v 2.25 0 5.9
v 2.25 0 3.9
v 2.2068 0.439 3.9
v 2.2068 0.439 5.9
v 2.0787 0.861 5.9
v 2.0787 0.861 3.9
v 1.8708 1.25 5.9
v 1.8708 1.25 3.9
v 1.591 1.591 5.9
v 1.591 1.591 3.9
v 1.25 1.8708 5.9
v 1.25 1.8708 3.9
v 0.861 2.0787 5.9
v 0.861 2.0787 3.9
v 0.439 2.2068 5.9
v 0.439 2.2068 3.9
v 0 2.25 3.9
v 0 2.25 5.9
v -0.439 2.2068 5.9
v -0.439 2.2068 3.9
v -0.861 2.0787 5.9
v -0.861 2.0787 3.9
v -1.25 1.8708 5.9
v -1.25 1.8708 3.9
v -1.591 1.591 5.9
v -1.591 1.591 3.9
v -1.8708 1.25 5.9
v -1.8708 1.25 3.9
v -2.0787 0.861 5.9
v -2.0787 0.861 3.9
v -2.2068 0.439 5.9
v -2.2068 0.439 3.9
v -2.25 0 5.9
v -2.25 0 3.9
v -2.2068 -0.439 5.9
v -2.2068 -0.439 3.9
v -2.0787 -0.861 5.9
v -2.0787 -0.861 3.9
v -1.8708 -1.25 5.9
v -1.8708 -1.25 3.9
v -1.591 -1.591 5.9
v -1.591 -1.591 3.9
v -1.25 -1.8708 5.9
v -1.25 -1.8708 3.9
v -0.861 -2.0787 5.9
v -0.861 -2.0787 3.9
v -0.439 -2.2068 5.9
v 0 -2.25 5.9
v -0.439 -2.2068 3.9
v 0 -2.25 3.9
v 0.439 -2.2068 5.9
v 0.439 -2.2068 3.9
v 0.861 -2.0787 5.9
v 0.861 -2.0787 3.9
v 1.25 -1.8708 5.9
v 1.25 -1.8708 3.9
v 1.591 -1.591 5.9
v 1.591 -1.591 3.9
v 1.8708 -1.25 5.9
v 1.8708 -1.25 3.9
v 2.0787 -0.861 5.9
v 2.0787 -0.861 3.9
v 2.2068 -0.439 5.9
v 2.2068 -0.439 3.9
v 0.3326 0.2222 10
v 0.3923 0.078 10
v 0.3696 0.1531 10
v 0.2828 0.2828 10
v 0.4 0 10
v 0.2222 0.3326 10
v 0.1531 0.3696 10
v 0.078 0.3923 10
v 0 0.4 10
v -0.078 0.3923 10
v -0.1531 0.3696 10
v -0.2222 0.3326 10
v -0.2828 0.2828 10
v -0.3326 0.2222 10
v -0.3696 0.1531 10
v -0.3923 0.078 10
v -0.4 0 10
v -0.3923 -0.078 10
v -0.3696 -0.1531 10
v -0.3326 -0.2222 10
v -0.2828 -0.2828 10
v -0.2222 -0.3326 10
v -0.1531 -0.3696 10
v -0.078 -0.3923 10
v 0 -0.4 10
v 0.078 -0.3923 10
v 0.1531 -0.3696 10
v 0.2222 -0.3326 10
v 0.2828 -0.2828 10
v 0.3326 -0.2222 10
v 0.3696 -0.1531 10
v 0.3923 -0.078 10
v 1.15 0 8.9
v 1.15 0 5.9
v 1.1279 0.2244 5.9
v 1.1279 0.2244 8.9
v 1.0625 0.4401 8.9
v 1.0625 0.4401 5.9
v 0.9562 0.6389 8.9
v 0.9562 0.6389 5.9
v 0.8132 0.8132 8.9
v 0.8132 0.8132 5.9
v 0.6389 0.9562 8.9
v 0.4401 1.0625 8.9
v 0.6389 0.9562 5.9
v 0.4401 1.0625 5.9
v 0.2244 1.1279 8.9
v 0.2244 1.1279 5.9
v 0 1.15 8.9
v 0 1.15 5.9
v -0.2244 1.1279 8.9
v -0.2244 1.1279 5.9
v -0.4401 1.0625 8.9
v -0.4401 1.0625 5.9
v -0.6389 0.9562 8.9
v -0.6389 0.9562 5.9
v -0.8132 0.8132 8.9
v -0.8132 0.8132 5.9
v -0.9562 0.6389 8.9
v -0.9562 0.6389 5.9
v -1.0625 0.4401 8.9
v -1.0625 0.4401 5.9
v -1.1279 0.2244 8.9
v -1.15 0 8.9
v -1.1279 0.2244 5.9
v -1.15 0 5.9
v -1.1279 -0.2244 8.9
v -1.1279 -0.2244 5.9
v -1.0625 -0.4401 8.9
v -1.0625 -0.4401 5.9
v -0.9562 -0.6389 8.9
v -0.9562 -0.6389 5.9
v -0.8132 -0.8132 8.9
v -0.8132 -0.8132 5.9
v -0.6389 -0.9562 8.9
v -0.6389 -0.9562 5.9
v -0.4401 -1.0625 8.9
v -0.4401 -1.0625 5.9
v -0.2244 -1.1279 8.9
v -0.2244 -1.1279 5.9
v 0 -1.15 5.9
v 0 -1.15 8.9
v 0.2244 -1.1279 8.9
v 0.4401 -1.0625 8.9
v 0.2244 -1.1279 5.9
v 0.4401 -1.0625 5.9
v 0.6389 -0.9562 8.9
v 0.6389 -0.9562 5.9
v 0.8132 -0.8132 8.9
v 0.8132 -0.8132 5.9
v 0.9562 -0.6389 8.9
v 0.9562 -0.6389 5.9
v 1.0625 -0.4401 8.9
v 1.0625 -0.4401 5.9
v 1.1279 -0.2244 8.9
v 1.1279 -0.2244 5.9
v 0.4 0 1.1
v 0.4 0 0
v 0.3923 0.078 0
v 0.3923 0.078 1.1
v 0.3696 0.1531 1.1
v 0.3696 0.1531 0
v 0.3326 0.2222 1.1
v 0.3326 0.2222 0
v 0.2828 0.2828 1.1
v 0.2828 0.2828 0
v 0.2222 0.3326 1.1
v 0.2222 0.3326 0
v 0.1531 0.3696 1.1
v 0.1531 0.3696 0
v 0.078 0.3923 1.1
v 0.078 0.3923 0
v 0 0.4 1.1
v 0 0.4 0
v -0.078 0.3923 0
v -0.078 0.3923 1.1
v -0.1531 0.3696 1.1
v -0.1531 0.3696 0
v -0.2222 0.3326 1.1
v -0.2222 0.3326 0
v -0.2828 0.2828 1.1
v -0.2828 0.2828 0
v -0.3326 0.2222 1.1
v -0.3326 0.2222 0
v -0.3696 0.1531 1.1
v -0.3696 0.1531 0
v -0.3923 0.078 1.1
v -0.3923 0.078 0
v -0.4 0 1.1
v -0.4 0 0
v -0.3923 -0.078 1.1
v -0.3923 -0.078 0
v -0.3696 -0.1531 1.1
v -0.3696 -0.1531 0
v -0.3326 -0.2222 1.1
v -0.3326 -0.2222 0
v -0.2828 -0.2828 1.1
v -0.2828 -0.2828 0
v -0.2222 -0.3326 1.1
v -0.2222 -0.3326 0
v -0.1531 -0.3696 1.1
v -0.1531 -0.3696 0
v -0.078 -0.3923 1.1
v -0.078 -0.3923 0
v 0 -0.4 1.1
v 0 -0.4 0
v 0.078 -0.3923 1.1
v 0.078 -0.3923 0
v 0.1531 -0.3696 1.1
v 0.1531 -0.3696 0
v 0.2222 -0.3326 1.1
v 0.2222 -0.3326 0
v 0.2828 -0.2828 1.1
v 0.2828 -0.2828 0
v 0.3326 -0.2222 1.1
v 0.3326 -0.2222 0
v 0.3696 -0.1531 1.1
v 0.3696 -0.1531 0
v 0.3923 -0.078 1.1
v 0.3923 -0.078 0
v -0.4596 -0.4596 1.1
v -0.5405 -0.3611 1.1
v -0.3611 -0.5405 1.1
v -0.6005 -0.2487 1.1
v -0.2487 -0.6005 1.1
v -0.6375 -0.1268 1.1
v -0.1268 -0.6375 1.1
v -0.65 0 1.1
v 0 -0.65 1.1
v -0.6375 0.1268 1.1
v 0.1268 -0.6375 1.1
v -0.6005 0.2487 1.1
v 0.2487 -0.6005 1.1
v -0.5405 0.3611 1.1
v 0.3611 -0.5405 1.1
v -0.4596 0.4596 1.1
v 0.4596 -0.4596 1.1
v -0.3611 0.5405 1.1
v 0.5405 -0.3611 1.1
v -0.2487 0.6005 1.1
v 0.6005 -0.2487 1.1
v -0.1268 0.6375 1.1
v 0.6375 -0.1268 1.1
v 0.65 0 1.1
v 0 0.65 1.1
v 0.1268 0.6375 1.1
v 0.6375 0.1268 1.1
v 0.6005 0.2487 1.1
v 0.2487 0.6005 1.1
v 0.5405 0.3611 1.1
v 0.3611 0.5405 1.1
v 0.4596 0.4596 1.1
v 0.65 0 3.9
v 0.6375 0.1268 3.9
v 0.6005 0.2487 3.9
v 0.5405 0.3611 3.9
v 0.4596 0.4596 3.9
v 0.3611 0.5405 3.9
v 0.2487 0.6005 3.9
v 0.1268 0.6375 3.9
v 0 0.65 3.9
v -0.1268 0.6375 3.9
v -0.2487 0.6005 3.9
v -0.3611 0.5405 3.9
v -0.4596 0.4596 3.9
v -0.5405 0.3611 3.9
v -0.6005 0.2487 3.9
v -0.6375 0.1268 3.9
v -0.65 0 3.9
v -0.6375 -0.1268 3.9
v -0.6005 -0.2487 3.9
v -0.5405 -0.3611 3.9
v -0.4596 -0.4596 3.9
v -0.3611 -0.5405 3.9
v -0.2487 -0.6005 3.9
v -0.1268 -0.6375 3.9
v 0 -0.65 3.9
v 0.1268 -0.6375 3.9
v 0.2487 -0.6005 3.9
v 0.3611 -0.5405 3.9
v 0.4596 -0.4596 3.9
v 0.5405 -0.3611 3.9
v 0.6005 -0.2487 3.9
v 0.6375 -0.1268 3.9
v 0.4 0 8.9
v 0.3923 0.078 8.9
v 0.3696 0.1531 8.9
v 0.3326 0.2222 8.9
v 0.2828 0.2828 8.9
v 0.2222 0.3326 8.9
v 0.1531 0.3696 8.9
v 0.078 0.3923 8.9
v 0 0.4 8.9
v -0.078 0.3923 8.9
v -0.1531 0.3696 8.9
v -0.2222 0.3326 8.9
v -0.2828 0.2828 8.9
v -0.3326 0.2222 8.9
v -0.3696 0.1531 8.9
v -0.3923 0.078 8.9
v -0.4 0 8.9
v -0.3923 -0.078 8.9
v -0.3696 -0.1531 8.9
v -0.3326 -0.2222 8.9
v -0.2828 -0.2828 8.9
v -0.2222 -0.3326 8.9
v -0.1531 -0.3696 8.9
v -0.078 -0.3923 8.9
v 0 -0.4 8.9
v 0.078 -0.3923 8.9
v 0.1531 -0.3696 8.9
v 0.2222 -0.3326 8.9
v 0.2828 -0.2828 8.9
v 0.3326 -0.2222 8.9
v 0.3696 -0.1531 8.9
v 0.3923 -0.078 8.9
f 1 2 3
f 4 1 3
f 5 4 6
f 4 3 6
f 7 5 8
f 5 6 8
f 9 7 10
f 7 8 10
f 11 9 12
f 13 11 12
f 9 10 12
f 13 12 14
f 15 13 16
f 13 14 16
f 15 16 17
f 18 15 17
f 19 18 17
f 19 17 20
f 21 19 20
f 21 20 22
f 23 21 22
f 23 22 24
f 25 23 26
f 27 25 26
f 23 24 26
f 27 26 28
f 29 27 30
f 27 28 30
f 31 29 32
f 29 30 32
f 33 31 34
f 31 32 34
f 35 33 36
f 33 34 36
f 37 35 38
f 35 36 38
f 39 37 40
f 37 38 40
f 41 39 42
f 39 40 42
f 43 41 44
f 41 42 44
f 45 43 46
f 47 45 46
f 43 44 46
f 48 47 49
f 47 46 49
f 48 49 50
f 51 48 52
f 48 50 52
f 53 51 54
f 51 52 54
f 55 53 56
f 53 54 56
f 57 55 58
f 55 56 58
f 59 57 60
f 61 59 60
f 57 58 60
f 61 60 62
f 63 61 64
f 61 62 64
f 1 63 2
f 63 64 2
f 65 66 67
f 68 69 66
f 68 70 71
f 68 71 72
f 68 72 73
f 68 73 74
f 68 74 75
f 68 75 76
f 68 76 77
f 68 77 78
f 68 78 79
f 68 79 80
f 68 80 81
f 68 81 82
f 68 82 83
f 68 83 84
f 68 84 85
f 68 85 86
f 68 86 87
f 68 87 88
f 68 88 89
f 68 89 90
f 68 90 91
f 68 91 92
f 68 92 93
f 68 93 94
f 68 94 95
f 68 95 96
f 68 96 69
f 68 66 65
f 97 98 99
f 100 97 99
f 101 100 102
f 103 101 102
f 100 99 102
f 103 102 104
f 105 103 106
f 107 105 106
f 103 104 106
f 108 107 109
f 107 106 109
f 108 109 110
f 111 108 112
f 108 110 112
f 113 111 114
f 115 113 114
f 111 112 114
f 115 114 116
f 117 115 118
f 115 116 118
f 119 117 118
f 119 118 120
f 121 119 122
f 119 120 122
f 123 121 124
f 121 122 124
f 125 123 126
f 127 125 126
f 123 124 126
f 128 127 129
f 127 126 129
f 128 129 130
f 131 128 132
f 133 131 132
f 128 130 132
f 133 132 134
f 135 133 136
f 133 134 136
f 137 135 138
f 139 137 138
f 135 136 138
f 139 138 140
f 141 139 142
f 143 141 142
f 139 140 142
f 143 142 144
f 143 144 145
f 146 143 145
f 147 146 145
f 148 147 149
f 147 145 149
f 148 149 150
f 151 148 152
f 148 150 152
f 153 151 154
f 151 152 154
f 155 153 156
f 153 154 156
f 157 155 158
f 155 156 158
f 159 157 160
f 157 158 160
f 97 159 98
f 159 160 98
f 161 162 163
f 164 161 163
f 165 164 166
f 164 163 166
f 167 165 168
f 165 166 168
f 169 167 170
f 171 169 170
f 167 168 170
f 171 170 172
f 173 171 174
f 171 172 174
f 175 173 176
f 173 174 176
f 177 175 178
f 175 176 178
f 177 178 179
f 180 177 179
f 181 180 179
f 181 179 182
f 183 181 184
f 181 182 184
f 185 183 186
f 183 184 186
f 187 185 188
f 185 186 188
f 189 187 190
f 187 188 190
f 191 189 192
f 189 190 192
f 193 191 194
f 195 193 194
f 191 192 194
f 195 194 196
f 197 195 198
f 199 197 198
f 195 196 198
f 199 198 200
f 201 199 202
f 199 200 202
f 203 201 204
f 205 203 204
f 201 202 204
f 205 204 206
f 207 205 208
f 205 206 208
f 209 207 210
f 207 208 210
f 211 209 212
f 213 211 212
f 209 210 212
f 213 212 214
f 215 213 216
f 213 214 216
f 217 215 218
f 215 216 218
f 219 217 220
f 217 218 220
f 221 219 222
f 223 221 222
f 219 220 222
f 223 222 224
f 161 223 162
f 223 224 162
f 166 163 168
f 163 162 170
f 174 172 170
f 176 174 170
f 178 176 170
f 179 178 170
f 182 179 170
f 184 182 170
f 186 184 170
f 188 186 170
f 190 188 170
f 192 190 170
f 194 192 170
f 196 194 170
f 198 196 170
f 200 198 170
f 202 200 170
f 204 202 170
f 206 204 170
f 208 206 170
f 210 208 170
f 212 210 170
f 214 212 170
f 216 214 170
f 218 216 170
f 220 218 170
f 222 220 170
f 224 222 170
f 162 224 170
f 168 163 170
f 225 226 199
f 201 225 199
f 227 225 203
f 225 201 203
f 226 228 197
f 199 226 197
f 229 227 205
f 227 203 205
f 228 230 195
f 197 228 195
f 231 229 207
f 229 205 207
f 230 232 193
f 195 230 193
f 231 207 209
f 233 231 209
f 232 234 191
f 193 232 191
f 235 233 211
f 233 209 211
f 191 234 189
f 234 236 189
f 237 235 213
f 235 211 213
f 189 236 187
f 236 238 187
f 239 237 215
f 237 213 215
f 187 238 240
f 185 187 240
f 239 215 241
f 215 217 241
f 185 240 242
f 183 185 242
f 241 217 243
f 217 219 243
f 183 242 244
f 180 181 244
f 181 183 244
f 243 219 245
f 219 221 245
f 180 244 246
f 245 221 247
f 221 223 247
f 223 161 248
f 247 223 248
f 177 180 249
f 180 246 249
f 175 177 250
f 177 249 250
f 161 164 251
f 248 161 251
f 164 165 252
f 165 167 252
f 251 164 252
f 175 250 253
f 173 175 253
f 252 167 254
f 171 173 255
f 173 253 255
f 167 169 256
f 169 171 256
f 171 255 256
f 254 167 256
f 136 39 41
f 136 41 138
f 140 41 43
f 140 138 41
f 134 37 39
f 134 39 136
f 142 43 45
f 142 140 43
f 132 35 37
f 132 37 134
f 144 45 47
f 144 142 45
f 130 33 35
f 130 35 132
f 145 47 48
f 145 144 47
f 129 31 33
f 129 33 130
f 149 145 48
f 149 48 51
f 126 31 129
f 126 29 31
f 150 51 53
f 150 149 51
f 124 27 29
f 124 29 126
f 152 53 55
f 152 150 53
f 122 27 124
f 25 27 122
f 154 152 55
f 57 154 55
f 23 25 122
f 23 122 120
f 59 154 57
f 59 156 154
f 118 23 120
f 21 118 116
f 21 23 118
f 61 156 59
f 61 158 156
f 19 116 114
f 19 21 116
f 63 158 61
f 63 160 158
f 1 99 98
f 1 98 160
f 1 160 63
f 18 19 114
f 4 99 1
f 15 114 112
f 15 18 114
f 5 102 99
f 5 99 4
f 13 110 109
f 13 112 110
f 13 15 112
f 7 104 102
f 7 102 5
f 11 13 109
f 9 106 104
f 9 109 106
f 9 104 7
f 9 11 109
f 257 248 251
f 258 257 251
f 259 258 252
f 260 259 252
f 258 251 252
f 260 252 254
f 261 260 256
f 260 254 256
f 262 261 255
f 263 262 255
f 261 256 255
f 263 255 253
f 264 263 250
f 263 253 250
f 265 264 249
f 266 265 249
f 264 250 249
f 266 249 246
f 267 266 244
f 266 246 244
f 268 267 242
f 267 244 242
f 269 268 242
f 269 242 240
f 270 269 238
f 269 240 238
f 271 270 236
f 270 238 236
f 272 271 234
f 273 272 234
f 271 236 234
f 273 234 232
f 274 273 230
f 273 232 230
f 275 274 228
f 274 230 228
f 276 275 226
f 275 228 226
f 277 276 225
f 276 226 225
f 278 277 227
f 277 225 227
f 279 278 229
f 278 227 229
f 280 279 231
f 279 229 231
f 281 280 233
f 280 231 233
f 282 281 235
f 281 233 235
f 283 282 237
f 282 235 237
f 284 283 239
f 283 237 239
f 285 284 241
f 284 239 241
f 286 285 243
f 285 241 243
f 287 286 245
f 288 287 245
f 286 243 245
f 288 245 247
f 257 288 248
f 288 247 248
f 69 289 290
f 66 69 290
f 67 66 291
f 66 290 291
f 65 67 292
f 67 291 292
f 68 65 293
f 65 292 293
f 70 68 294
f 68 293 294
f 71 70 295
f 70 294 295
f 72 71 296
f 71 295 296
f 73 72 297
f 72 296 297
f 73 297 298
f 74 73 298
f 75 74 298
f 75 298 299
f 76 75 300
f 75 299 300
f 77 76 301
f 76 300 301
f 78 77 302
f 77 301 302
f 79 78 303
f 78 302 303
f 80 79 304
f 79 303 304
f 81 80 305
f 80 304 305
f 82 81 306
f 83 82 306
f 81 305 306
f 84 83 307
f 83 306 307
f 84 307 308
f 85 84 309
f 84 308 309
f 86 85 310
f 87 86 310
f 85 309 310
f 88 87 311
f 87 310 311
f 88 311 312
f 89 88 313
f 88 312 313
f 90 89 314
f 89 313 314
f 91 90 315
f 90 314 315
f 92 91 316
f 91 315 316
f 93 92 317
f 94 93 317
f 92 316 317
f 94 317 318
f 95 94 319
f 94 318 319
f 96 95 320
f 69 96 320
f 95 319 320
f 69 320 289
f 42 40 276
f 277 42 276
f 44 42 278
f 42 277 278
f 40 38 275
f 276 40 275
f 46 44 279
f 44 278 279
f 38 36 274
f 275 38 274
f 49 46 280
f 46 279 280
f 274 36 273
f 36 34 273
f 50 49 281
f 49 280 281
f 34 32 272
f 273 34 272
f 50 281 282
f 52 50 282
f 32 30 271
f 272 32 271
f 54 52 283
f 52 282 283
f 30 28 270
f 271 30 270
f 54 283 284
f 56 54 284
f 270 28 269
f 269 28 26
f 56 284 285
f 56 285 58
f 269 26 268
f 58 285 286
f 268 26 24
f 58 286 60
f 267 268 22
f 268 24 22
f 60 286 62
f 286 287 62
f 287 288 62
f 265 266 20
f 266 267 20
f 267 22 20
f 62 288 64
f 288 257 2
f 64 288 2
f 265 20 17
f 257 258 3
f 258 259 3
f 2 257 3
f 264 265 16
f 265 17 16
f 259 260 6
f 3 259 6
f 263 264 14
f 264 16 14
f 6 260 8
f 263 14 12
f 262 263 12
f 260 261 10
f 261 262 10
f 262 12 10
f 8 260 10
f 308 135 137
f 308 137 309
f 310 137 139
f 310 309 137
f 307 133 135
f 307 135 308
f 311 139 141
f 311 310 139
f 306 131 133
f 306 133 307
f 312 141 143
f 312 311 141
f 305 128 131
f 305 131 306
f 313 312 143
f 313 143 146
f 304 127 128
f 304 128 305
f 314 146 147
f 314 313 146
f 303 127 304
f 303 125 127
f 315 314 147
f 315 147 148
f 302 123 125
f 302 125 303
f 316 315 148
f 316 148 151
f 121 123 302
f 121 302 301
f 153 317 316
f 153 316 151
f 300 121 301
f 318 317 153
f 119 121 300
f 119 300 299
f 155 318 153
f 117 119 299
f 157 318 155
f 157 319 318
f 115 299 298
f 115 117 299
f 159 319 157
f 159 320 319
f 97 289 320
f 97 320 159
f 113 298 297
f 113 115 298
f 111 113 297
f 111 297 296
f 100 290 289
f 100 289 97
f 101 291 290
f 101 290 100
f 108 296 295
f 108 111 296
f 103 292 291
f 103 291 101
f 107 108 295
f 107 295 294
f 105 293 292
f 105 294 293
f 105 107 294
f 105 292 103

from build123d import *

# Parameters (mm, degrees)
SKETCH1_R           = 0.4
BOSS_EXTRUDE1_DEPTH = 1.1
SKETCH2_R           = 0.65
BOSS_EXTRUDE2_DEPTH = 2.8
SKETCH3_R           = 2.25
BOSS_EXTRUDE3_DEPTH = 2
SKETCH4_R           = 1.15
BOSS_EXTRUDE4_DEPTH = 3
SKETCH5_R           = 0.4
BOSS_EXTRUDE5_DEPTH = 1.1


with BuildPart() as part:
    # Sketch1 → Boss-Extrude1 (new body)
    with BuildSketch(Plane.XY):
        Circle(SKETCH1_R)
    extrude(amount=BOSS_EXTRUDE1_DEPTH)

    # Sketch2 → Boss-Extrude2 (add)
    with BuildSketch(Plane.XY.offset(1.1)):
        Circle(SKETCH2_R)
    extrude(amount=BOSS_EXTRUDE2_DEPTH)

    # Sketch3 → Boss-Extrude3 (add)
    with BuildSketch(Plane.XY.offset(3.9)):
        Circle(SKETCH3_R)
    extrude(amount=BOSS_EXTRUDE3_DEPTH)

    # Sketch4 → Boss-Extrude4 (add)
    with BuildSketch(Plane.XY.offset(5.9)):
        Circle(SKETCH4_R)
    extrude(amount=BOSS_EXTRUDE4_DEPTH)

    # Sketch5 → Boss-Extrude5 (add)
    with BuildSketch(Plane.XY.offset(8.9)):
        Circle(SKETCH5_R)
    extrude(amount=BOSS_EXTRUDE5_DEPTH)


solid = part.part
